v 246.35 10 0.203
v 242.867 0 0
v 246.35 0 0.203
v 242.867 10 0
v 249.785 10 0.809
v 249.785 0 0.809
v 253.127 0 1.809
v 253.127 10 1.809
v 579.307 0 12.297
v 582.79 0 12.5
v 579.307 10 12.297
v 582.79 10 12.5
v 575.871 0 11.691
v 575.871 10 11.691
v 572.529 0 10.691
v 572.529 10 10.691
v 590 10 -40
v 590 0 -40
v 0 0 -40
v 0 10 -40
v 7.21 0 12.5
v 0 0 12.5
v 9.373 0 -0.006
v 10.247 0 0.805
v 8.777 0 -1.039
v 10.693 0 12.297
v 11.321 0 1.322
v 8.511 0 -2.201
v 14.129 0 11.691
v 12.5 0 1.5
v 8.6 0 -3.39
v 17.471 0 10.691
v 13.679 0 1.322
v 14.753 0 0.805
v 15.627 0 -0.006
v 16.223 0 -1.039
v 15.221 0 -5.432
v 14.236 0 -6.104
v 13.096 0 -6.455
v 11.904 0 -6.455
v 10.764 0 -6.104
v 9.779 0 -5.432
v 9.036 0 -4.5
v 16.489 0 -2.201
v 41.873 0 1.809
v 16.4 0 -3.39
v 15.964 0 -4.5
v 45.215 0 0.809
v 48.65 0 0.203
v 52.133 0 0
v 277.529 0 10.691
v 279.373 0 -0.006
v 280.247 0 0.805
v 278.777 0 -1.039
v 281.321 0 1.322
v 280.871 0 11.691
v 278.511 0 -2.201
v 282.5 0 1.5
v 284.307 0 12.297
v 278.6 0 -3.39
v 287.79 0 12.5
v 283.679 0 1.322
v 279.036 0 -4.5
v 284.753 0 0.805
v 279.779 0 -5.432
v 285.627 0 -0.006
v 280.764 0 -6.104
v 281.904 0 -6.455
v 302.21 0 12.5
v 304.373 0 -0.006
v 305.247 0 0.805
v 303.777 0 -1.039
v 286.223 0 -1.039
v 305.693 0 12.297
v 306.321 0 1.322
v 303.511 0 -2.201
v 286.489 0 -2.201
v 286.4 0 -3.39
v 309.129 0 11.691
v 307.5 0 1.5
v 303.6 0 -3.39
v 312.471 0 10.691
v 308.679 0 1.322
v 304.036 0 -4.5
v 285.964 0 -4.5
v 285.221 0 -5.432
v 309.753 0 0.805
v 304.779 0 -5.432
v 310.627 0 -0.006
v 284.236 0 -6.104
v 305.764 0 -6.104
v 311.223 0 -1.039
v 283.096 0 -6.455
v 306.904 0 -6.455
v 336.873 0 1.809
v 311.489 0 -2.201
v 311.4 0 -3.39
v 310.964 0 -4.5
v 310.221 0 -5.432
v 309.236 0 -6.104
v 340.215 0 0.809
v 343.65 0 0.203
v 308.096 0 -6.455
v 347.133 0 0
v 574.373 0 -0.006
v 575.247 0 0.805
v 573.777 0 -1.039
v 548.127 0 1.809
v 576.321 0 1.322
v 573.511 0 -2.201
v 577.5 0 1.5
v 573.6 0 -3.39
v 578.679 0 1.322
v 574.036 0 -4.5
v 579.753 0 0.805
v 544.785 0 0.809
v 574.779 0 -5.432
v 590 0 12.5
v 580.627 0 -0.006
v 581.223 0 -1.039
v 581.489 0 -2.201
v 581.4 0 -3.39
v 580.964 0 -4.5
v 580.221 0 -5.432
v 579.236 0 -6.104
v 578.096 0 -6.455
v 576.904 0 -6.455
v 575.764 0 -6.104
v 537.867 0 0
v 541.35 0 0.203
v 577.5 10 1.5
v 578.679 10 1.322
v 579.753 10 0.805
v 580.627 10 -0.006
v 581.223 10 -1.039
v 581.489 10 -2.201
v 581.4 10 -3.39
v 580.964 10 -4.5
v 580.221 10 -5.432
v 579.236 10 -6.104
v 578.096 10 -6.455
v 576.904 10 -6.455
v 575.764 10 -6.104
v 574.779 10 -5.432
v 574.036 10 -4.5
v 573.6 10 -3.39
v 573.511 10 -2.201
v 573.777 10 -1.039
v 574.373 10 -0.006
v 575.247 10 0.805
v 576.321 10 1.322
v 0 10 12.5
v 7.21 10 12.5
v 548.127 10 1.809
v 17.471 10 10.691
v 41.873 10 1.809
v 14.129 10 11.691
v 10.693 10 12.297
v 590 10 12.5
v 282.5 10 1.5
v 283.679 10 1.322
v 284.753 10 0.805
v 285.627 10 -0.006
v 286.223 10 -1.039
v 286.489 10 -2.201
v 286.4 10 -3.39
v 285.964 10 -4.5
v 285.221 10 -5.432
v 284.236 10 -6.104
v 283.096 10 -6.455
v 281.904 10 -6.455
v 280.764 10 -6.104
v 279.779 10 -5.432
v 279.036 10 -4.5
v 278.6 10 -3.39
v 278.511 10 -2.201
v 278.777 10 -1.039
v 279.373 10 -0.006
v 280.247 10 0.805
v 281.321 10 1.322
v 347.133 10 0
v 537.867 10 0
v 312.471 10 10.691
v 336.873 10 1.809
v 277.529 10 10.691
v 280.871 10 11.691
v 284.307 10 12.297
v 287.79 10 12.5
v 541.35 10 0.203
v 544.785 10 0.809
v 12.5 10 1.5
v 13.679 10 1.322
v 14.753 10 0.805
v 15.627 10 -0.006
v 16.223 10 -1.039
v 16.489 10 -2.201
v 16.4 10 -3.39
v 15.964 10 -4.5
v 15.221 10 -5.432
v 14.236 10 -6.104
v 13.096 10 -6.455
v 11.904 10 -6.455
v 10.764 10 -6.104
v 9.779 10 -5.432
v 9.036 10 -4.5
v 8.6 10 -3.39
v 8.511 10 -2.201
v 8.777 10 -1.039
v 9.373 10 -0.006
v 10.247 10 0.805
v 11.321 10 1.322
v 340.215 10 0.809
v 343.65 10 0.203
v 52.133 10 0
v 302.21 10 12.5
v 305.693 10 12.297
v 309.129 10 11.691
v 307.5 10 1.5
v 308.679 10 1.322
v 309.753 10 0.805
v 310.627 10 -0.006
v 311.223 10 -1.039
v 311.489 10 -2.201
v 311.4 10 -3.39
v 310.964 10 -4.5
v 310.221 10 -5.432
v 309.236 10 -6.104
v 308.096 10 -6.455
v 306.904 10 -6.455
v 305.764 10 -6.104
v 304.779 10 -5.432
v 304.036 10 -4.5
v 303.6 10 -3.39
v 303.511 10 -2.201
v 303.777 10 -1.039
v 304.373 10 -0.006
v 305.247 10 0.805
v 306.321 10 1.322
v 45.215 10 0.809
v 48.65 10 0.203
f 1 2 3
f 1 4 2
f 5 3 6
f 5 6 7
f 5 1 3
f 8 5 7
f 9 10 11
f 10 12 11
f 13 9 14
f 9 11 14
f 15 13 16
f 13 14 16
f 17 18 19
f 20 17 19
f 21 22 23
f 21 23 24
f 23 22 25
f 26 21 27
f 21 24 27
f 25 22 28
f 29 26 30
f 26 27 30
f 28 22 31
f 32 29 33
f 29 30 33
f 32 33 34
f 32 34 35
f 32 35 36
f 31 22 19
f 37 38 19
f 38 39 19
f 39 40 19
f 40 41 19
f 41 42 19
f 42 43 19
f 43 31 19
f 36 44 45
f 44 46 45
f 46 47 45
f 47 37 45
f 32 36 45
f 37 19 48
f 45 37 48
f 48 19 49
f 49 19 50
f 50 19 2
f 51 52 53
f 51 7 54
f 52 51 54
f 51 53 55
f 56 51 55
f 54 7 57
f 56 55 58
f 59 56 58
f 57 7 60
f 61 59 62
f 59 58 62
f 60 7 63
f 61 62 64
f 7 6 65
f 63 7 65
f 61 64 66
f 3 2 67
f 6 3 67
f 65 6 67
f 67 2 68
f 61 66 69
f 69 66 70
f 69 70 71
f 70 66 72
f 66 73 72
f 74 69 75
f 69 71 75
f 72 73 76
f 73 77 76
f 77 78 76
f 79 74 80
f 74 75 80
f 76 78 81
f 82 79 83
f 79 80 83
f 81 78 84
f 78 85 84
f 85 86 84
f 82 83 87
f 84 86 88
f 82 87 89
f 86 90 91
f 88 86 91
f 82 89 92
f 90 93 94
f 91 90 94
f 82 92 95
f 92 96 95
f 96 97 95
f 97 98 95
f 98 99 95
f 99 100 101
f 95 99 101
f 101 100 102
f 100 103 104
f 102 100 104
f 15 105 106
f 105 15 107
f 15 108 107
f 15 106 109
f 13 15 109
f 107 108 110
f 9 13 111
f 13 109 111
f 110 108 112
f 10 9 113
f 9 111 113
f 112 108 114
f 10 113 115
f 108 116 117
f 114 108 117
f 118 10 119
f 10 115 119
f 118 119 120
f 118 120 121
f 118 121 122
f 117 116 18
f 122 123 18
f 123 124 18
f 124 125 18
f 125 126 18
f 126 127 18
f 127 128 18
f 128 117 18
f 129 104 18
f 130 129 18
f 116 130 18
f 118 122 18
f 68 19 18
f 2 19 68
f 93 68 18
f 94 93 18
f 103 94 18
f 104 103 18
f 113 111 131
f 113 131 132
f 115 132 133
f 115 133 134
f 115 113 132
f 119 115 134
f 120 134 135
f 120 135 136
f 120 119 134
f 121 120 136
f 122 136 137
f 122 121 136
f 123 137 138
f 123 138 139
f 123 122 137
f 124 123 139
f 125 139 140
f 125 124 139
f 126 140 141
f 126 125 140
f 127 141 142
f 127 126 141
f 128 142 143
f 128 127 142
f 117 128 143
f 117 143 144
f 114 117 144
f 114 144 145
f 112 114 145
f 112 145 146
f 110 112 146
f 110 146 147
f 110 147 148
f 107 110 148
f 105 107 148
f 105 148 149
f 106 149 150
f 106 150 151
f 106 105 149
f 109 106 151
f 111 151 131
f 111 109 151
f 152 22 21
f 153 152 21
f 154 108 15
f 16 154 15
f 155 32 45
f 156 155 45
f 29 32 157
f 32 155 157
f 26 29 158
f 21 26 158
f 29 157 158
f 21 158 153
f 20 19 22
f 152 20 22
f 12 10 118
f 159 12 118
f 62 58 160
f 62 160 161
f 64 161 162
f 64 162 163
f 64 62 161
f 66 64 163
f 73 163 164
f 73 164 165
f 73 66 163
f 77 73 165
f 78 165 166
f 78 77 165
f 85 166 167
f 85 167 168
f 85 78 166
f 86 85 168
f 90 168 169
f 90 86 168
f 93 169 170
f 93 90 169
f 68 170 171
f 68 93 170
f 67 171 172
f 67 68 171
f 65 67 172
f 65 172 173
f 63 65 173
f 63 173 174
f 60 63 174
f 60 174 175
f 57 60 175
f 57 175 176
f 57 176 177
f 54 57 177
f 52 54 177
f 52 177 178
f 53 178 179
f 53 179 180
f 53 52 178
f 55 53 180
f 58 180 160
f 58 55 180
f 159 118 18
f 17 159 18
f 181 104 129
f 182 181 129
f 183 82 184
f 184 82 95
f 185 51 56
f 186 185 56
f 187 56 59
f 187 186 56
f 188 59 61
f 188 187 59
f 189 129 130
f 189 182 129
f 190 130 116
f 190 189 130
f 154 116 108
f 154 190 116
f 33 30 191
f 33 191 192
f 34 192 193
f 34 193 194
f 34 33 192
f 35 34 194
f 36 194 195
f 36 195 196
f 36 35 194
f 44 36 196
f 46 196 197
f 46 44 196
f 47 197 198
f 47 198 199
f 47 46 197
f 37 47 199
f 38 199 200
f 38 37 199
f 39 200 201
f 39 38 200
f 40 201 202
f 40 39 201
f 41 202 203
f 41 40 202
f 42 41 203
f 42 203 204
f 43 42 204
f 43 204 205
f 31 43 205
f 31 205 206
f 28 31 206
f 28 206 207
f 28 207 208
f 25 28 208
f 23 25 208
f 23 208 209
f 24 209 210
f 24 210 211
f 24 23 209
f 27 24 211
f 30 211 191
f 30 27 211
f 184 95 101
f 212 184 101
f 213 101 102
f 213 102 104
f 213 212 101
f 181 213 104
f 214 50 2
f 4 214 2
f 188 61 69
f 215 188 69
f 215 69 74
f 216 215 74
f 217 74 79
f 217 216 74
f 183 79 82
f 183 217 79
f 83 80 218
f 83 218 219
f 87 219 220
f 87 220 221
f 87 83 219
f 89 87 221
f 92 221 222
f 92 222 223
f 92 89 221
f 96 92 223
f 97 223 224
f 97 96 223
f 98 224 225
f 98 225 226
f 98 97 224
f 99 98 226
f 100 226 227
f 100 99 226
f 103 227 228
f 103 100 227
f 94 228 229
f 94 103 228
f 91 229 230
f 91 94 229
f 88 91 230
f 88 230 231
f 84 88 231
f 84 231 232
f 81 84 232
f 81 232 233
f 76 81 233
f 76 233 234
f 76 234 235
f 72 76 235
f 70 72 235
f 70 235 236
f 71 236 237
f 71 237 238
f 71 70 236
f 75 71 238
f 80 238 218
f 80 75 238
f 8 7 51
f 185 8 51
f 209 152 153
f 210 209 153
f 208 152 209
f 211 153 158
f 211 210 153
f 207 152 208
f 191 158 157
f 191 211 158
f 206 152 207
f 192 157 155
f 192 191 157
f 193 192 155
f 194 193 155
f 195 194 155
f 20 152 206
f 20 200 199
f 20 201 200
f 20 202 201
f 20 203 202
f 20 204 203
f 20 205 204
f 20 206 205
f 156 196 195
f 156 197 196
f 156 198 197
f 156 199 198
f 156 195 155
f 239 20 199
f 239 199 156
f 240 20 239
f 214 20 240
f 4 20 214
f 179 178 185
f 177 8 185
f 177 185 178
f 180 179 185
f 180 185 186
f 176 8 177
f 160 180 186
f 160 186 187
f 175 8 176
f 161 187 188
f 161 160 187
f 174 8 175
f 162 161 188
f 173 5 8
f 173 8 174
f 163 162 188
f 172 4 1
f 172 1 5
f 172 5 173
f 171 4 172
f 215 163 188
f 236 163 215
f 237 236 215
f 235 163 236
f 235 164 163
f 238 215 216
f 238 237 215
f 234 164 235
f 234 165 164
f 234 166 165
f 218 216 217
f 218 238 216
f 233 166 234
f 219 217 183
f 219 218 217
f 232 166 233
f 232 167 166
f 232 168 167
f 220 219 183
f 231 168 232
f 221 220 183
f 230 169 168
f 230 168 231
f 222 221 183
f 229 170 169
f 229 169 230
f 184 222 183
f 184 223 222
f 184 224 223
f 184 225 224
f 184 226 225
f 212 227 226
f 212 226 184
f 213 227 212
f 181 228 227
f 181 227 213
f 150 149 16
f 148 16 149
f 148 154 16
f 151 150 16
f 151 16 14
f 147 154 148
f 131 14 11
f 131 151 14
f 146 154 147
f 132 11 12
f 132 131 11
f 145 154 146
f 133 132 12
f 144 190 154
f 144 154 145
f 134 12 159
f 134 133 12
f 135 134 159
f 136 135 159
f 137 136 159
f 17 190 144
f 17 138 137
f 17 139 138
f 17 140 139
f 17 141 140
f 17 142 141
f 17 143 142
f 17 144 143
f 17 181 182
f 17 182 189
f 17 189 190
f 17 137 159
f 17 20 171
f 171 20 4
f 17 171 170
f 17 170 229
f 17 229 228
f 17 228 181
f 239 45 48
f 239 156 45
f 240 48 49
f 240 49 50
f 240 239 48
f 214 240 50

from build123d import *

# Parameters (mm, degrees)
SKETCH1_R           = 4
BOSS_EXTRUDE2_DEPTH = 10
FILLET1_R           = 30
FILLET2_R           = 30


with BuildPart() as part:
    # Sketch1 → Boss-Extrude2 (new body)
    with BuildSketch(Plane(origin=(0, 0, 0), x_dir=(1, 0, 0), z_dir=(0, 1, 0))):
        Polygon((12.5, -12.5), (46.843467743, 0), (248.156532257, 0), (282.5, -12.5), (307.5, -12.5), (341.843467743, 0), (543.156532257, 0), (577.5, -12.5), (590, -12.5), (590, 40), (0, 40), (0, -12.5), align=None)
        with Locations(Location((12.5, 2.5, 0), (0, 0, 270))):
            Circle(SKETCH1_R, mode=Mode.SUBTRACT)
        with Locations(Location((282.5, 2.5, 0), (0, 0, 270))):
            Circle(SKETCH1_R, mode=Mode.SUBTRACT)
        with Locations(Location((307.5, 2.5, 0), (0, 0, 270))):
            Circle(SKETCH1_R, mode=Mode.SUBTRACT)
        with Locations(Location((577.5, 2.5, 0), (0, 0, 270))):
            Circle(SKETCH1_R, mode=Mode.SUBTRACT)
    extrude(amount=BOSS_EXTRUDE2_DEPTH)

    # Fillet1
    fillet1_edges = [part.edges().sort_by_distance(p)[0] for p in [
        (46.843467743, 5, 0),
        (12.5, 5, 12.5),
    ]]
    fillet(fillet1_edges, radius=FILLET1_R)

    # Fillet2
    fillet2_edges = [part.edges().sort_by_distance(p)[0] for p in [
        (307.5, 5, 12.5),
        (282.5, 5, 12.5),
        (248.156532257, 5, 0),
        (577.5, 5, 12.5),
        (543.156532257, 5, 0),
        (341.843467743, 5, 0),
    ]]
    fillet(fillet2_edges, radius=FILLET2_R)


solid = part.part
